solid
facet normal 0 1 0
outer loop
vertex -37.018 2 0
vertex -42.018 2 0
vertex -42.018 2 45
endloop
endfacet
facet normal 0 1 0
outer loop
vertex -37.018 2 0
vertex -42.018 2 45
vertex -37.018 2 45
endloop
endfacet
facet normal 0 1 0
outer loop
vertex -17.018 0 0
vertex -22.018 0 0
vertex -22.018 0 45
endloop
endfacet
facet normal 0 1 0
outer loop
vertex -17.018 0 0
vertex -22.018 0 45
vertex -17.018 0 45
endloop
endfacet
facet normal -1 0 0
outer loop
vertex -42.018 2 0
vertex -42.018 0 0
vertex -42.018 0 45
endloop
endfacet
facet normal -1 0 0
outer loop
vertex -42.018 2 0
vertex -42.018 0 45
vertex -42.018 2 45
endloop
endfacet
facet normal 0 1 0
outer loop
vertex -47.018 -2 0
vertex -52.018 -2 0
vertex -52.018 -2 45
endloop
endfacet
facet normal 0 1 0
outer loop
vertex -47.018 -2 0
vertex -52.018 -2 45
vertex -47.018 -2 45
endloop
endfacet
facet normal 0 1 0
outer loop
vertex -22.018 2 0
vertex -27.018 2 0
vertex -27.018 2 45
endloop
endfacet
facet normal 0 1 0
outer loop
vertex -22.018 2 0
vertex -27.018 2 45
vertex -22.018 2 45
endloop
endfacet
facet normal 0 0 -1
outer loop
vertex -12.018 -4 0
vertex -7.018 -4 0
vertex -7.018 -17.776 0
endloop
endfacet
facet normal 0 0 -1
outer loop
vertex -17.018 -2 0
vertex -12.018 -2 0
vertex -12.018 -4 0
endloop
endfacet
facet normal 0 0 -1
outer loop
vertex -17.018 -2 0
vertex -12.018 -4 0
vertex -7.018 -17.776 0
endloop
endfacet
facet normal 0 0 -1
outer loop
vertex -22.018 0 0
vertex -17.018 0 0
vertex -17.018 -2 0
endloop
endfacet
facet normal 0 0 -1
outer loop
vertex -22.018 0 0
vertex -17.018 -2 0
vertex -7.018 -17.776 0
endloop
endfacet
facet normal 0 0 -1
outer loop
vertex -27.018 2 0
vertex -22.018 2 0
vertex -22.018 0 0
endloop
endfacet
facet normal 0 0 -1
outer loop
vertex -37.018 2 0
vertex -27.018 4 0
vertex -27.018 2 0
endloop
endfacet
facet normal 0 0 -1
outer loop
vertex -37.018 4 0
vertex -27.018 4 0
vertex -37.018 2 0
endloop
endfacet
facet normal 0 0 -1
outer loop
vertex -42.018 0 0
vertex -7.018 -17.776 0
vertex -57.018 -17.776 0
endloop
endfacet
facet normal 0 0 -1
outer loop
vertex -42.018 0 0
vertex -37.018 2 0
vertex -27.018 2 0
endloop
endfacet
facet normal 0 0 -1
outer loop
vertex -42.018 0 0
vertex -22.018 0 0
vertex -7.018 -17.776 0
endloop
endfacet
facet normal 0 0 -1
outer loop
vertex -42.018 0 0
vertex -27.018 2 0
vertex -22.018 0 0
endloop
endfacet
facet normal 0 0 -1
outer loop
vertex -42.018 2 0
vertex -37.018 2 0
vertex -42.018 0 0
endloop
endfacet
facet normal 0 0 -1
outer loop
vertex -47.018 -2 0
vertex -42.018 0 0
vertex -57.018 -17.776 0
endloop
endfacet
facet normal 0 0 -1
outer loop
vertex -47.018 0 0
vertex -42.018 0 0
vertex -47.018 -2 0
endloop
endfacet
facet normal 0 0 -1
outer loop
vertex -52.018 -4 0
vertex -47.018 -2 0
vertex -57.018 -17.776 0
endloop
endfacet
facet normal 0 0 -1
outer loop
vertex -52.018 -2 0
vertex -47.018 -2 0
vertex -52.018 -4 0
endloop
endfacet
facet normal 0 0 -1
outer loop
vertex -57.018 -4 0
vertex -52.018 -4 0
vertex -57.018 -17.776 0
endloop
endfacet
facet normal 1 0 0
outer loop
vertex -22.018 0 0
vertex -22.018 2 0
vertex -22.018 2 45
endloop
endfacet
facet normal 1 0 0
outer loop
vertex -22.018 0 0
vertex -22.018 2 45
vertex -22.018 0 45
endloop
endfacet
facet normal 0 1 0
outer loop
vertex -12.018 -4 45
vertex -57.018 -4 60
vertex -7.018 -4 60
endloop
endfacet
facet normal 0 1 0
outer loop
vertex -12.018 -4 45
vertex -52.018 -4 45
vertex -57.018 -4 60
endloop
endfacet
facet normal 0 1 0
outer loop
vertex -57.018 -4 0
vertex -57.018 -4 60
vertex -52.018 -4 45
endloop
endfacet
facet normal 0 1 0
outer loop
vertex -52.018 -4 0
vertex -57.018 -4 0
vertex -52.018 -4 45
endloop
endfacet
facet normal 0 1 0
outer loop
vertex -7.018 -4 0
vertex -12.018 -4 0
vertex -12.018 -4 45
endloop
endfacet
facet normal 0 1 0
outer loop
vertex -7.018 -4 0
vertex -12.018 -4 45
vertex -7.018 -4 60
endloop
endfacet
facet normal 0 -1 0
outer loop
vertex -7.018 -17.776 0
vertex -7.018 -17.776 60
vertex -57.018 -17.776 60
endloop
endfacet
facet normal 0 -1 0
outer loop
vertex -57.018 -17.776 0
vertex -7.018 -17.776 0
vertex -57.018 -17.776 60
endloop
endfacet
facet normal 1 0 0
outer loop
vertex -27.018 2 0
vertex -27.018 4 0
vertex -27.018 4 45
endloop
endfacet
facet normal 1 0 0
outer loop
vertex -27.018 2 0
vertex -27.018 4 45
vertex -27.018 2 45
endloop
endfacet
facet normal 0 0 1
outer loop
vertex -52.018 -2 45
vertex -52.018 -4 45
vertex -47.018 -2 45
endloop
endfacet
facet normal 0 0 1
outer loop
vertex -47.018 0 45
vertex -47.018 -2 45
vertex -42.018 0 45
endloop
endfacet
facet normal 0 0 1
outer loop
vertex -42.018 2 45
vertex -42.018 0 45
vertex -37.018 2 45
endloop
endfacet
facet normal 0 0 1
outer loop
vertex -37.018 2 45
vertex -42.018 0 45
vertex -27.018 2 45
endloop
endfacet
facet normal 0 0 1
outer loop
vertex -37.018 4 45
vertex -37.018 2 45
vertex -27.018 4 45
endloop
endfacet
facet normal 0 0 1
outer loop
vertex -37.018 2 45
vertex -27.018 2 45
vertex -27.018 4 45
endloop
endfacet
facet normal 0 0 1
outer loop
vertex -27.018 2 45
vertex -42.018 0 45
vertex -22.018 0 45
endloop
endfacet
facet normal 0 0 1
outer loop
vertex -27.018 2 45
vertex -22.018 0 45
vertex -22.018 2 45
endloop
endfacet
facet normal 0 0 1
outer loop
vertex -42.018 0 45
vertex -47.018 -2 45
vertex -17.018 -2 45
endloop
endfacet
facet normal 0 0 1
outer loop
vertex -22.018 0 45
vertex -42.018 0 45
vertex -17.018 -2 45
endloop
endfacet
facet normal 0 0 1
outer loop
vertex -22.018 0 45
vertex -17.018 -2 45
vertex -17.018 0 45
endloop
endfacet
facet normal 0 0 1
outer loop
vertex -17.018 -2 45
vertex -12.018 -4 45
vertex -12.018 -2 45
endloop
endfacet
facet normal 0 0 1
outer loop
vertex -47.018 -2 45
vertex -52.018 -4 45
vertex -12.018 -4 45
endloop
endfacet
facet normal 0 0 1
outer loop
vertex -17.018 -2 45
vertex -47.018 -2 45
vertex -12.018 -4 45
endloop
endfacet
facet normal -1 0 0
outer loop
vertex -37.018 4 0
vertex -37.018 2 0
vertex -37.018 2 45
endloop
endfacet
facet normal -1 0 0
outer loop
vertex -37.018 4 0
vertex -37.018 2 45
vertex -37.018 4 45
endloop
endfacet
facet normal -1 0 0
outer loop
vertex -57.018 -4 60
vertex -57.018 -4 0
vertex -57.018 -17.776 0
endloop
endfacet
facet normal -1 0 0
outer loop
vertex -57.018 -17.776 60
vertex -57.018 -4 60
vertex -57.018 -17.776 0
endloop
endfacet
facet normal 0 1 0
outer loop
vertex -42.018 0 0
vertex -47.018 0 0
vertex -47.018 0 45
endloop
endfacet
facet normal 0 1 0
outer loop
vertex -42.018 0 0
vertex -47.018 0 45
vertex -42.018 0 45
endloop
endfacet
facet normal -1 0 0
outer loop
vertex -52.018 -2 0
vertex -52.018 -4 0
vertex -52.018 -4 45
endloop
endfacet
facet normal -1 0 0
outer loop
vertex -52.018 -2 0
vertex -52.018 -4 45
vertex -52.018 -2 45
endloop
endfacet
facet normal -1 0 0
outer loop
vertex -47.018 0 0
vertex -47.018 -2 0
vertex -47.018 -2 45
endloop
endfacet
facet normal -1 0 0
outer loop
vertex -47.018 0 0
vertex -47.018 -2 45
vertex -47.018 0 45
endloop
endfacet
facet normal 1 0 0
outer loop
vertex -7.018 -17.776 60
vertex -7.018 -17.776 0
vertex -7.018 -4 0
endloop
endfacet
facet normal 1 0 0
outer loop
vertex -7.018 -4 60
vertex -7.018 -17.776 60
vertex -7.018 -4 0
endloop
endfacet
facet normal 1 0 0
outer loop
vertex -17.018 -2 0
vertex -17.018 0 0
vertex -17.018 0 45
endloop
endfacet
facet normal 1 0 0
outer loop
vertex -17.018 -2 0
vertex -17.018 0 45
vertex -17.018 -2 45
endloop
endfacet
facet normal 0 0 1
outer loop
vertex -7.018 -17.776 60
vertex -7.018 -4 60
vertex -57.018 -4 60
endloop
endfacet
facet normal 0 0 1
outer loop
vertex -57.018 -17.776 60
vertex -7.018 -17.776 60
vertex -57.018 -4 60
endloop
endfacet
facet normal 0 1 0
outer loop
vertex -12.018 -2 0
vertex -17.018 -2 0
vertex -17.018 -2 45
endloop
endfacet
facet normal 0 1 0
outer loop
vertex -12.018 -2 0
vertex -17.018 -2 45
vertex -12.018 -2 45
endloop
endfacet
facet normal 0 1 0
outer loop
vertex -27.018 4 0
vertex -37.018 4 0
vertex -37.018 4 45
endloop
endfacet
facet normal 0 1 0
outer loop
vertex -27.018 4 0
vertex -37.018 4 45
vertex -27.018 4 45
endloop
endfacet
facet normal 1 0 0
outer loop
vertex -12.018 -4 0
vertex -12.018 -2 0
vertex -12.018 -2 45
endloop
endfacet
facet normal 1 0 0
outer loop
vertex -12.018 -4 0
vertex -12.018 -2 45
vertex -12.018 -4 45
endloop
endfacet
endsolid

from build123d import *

# Parameters (mm, degrees)
EXTRUDE_1_DEPTH     = 60
SKETCH_3_W          = 15
SKETCH_3_H          = 8
CUT_EXTRUDE_1_DEPTH = 50


with BuildPart() as part:
    # 草图1 → 凸台-拉伸1 (new body)
    with BuildSketch(Plane.XY):
        Polygon((-37.017562776, 4), (-27.017562776, 4), (-27.017562776, 2), (-22.017562776, 2), (-22.017562776, 0), (-17.017562776, 0), (-17.017562776, -2), (-12.017562776, -2), (-12.017562776, -4), (-7.017562776, -4), (-7.017562776, -6), (-7.017562776, -17.776315497), (-57.017562776, -17.776315497), (-57.017562776, -6), (-57.017562776, -4), (-52.017562776, -4), (-52.017562776, -2), (-47.017562776, -2), (-47.017562776, 0), (-42.017562776, 0), (-42.017562776, 2), (-37.017562776, 2), align=None)
    extrude(amount=EXTRUDE_1_DEPTH)

    # 草图3 → 切除-拉伸1 (cut)
    with BuildSketch(Plane(origin=(-7.017562776, 0, 0), x_dir=(0, 0, -1), z_dir=(1, 0, 0))):
        with Locations((-52.5, 0)):
            Rectangle(SKETCH_3_W, SKETCH_3_H)
    extrude(amount=-CUT_EXTRUDE_1_DEPTH, mode=Mode.SUBTRACT)


solid = part.part
